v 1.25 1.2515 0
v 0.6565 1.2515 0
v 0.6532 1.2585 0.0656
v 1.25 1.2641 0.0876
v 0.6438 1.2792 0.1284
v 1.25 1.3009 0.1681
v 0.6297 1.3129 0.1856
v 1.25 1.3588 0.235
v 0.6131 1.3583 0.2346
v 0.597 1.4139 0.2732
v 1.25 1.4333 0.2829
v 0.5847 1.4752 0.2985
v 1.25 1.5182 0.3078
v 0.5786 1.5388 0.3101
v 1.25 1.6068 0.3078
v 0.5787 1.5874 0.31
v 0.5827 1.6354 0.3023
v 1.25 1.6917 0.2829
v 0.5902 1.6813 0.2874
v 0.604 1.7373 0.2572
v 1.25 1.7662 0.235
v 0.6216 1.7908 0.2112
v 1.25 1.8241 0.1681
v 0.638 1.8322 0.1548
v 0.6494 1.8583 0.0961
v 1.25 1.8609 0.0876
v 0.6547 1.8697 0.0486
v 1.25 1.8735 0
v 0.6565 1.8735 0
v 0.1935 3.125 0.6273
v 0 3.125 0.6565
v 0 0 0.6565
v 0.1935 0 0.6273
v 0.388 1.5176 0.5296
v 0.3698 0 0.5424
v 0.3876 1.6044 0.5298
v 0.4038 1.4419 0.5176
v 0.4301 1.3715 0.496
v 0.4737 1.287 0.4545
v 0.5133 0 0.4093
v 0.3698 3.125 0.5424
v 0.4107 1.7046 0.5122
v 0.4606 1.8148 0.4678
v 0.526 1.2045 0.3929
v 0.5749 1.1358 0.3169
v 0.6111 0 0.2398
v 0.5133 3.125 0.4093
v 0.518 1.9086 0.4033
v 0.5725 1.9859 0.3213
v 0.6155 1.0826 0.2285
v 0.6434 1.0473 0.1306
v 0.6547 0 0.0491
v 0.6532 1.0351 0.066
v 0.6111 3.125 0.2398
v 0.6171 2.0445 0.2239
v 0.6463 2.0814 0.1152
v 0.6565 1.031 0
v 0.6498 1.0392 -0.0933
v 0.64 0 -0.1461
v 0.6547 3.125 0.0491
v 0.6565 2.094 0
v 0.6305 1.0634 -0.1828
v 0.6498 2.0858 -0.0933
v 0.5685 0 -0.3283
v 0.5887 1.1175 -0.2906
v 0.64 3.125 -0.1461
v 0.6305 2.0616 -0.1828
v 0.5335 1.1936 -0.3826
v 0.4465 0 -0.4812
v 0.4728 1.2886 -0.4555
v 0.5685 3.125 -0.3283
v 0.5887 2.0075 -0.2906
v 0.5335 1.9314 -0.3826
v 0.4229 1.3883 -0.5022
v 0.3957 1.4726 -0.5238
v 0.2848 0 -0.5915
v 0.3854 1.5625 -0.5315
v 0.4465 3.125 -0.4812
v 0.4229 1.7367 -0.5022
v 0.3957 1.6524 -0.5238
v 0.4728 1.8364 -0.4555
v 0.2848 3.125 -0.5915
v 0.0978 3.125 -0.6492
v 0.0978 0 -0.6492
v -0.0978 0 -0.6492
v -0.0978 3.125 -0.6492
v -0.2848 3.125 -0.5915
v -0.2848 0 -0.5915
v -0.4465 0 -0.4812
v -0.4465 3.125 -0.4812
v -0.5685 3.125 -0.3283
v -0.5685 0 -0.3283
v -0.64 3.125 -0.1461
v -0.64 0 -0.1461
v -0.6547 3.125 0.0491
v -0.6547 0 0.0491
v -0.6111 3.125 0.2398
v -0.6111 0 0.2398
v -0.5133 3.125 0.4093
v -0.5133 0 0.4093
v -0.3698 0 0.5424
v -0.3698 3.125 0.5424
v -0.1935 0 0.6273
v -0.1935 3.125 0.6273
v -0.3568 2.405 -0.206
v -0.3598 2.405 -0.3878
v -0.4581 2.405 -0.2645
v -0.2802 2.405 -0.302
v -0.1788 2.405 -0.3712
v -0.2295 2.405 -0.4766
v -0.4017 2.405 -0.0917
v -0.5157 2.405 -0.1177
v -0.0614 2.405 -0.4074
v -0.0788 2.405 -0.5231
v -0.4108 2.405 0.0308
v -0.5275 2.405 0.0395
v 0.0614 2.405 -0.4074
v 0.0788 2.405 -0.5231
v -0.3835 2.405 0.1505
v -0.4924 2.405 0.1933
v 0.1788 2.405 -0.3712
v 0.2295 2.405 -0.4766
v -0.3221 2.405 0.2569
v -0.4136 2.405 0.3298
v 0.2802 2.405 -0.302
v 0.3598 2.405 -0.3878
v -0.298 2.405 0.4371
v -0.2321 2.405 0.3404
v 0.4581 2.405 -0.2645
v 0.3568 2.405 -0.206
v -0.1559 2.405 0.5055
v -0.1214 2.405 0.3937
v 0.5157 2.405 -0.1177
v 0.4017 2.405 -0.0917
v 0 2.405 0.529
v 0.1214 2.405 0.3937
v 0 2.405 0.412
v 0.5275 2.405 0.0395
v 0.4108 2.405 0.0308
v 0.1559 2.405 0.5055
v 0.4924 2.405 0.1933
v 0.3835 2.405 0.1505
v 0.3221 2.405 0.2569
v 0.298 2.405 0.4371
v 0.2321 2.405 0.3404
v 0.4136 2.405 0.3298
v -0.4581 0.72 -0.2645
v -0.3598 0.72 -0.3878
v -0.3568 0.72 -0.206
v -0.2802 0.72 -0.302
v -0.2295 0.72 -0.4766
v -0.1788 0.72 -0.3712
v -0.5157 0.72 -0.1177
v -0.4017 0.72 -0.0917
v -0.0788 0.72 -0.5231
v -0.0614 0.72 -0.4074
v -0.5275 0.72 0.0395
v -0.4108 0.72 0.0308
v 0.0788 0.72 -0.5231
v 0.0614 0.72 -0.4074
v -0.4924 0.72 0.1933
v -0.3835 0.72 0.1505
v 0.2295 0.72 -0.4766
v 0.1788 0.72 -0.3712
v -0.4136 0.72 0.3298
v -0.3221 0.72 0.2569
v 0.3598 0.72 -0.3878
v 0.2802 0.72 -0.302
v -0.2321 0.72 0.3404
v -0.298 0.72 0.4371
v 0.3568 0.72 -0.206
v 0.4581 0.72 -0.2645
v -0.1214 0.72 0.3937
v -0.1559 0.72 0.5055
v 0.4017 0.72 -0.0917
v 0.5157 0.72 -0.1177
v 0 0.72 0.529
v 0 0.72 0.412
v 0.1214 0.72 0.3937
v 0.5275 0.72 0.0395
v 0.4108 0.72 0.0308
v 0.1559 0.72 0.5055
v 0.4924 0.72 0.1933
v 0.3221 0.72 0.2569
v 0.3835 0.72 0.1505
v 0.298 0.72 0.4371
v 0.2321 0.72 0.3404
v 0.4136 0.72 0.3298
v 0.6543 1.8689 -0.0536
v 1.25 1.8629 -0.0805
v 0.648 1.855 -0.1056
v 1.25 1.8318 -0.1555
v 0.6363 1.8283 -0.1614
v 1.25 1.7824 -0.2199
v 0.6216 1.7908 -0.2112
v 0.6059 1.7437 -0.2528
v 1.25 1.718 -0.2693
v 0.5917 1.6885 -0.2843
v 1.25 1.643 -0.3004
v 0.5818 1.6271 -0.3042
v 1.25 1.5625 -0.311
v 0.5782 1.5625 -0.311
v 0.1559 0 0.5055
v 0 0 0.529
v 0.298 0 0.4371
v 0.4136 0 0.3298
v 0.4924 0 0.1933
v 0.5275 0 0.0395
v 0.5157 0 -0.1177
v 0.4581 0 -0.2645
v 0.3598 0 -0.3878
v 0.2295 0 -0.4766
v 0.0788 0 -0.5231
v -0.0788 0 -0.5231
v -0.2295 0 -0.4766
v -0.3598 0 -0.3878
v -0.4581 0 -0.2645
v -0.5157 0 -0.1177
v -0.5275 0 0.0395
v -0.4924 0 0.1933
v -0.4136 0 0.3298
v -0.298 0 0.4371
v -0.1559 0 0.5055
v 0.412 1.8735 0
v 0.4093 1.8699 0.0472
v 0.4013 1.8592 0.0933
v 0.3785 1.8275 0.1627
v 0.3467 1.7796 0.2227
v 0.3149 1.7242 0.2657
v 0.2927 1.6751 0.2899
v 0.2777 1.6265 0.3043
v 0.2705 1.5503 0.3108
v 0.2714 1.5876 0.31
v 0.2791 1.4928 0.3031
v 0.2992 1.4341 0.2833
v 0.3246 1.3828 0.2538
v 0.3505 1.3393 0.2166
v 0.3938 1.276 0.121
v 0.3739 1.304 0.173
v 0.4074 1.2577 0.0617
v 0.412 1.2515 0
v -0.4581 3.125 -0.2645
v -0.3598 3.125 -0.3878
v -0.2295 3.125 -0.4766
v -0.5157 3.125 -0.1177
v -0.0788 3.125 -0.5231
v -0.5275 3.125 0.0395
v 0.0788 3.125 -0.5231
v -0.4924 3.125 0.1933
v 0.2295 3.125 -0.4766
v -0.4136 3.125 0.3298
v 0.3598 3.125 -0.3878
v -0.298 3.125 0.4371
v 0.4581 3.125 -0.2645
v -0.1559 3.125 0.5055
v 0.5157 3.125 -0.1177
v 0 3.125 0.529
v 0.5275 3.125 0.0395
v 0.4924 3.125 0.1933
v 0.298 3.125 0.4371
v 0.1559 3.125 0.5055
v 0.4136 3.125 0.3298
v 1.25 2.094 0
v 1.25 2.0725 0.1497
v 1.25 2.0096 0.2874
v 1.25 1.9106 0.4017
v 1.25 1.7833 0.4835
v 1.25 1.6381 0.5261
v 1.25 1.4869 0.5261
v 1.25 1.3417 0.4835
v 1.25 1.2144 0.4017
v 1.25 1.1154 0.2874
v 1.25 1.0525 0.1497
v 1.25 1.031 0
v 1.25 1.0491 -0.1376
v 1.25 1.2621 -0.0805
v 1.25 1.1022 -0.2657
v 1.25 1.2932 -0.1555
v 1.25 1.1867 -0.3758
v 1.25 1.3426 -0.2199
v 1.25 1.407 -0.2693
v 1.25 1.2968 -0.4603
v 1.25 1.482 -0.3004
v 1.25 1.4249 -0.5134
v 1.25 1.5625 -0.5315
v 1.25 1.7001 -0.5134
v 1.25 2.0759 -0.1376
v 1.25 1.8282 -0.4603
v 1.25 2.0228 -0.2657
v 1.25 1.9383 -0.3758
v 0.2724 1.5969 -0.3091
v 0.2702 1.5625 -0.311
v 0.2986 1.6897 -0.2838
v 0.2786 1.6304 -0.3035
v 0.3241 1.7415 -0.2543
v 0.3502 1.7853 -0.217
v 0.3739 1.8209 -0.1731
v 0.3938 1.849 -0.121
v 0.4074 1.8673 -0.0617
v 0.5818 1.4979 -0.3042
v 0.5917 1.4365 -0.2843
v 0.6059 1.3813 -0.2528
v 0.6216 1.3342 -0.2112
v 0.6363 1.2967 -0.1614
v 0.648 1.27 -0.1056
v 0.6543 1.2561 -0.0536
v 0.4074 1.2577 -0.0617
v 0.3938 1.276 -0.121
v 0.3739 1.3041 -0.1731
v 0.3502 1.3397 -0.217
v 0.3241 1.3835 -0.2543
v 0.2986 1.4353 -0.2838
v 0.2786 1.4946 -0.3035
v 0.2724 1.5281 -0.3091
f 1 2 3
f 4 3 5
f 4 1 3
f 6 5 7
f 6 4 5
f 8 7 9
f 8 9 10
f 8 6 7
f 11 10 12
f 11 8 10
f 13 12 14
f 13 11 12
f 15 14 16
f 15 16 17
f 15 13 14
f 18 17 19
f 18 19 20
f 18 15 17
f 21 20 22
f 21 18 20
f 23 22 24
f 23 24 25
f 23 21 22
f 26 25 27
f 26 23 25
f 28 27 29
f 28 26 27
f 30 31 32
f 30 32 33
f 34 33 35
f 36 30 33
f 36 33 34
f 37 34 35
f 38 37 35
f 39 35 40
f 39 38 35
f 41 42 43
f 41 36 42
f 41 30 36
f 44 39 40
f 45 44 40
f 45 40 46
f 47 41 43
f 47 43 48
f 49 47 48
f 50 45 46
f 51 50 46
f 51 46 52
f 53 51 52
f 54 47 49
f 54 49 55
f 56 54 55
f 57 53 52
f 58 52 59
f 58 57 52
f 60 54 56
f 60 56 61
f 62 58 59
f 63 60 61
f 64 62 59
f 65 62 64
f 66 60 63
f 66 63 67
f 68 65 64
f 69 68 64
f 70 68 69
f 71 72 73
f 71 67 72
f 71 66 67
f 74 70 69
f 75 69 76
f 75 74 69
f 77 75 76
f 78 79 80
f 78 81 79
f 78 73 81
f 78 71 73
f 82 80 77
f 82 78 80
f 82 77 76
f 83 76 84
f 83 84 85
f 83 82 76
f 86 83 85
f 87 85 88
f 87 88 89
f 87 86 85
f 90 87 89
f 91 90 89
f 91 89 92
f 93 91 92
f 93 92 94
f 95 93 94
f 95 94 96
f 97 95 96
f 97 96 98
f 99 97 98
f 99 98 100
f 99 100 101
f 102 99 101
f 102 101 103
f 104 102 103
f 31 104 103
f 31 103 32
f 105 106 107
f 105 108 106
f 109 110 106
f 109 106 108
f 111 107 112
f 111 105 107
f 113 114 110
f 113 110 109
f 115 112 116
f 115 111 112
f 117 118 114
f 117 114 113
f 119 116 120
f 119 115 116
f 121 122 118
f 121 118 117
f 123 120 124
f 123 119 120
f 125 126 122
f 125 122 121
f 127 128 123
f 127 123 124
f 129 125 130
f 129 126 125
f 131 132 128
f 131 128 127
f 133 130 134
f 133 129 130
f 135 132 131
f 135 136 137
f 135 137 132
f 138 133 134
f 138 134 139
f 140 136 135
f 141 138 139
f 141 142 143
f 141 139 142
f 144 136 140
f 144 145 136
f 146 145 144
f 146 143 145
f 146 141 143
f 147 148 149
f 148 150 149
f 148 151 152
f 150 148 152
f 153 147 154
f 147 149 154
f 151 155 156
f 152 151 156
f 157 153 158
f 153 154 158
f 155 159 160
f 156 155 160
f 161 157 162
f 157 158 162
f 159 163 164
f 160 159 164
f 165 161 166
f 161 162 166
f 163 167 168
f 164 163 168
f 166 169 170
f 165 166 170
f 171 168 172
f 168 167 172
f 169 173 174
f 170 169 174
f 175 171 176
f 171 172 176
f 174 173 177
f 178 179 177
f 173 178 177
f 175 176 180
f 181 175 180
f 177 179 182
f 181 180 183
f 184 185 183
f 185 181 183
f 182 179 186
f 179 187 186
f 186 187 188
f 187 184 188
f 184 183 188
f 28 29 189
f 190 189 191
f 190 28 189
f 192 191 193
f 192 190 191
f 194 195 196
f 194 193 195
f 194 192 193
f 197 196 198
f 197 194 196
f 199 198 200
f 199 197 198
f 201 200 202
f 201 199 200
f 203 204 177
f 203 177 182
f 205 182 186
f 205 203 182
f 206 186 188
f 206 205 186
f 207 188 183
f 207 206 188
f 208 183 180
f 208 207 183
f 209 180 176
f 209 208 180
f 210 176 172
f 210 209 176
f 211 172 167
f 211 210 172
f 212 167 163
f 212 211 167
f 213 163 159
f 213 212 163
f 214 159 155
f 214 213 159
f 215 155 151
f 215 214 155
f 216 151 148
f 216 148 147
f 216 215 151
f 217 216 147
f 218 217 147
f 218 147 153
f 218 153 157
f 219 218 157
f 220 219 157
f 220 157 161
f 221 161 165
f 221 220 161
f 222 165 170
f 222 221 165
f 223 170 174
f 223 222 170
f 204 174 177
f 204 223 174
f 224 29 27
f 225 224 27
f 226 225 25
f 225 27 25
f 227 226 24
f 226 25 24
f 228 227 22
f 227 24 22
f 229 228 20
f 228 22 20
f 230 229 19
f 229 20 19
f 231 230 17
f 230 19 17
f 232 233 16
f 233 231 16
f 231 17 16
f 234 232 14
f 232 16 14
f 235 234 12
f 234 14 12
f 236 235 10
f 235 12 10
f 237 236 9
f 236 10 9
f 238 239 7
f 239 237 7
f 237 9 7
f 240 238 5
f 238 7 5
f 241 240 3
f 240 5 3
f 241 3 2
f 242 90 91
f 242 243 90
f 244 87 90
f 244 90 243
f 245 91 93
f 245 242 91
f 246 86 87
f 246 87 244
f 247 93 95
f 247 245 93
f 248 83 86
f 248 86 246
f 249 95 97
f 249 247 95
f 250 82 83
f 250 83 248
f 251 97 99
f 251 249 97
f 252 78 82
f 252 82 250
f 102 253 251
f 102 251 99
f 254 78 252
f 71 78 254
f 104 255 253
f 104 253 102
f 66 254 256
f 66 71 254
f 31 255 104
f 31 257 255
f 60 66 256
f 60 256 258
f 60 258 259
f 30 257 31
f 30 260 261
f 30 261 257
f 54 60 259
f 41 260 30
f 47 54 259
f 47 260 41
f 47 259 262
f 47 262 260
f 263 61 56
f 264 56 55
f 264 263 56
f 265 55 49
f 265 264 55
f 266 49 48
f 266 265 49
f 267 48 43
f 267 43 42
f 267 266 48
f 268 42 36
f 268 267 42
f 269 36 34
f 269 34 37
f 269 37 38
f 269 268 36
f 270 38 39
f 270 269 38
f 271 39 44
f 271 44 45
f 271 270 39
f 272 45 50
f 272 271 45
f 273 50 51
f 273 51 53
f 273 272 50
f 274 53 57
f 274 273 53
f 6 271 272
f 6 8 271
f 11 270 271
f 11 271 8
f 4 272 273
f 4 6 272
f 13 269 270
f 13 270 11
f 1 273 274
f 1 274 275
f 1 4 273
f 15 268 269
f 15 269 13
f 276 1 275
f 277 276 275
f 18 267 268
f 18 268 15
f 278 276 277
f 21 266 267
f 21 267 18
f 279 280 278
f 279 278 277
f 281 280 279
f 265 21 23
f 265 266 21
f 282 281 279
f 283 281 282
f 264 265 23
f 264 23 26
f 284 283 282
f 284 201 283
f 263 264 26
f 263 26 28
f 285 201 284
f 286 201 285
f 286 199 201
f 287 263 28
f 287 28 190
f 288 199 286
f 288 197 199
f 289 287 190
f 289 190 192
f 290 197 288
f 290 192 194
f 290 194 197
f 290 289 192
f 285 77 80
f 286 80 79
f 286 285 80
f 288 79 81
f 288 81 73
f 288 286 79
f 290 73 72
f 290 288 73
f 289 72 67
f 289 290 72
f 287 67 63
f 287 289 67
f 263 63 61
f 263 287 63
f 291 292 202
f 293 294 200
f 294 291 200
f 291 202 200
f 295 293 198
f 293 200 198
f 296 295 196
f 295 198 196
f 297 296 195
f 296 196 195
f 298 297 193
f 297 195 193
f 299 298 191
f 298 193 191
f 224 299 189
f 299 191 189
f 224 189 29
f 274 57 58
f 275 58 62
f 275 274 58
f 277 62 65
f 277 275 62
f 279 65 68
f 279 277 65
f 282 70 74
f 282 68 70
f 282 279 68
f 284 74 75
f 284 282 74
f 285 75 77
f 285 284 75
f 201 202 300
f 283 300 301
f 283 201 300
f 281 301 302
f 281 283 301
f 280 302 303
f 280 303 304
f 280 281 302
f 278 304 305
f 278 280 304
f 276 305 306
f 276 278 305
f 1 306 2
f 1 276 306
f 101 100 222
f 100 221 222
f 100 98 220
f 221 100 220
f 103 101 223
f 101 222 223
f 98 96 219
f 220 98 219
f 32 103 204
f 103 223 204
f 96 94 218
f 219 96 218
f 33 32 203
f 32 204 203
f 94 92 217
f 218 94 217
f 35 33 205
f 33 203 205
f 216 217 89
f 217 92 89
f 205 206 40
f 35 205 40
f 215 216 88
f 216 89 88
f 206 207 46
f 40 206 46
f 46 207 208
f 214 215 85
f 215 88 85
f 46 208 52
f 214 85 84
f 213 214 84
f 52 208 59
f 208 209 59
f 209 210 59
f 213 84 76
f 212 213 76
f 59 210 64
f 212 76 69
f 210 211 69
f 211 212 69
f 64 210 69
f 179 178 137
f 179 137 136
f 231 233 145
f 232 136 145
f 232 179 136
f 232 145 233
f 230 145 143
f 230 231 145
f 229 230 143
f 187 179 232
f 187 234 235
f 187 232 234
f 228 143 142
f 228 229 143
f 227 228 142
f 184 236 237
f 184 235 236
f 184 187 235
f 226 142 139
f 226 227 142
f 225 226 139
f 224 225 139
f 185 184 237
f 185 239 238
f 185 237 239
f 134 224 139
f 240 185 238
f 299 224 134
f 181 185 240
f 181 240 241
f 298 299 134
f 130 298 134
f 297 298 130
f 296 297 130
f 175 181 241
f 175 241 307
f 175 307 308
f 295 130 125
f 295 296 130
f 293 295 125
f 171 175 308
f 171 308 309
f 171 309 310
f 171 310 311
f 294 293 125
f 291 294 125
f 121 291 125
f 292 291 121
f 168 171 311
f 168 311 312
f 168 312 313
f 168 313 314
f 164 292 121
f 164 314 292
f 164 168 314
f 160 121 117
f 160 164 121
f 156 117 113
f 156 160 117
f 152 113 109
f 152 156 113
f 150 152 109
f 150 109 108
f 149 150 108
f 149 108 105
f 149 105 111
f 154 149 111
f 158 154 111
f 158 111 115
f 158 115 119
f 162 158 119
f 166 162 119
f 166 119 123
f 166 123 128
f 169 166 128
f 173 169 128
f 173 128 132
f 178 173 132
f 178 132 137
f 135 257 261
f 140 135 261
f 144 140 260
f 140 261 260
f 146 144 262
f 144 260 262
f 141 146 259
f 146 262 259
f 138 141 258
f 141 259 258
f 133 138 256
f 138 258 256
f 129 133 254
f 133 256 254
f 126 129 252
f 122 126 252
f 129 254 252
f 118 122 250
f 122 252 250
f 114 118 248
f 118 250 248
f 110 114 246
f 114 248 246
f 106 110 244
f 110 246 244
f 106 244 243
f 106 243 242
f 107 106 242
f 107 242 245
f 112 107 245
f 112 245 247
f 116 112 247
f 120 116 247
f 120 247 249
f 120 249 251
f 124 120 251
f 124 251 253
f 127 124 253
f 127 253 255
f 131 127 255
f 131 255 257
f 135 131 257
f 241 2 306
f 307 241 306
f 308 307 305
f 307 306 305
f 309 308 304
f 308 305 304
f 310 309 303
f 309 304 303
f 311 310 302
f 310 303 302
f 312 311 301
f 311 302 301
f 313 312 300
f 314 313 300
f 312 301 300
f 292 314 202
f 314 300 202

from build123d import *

# Parameters (mm, degrees)
SKETCH1_R                = 0.6565
SKETCH1_R_2              = 0.529
SKETCH1_R_3              = 0.412
BOSS_EXTRUDE1_DEPTH      = 1.5625
SKETCH1_3_R              = 0.529
SKETCH1_3_R_2            = 0.412
CUT_EXTRUDE1_DEPTH       = 0.72
BOSS_EXTRUDE2_REACH      = 5.719
BOSS_EXTRUDE2_END_RADIUS = 0.6565
CUT_EXTRUDE2_REACH       = 5.719


with BuildPart() as part:
    # Sketch1 → Boss-Extrude1 (new body)
    # profile 1 of 2: a face of its own
    with BuildSketch(Plane(origin=(0, 0, 0), x_dir=(1, 0, 0), z_dir=(0, 1, 0))):
        with Locations(Location((0, 0, 0), (0, 0, 270))):
            Circle(SKETCH1_R)
        Circle(SKETCH1_R_2, mode=Mode.SUBTRACT)
    # profile 2 of 2: a face of its own
    with BuildSketch(Plane(origin=(0, 0, 0), x_dir=(1, 0, 0), z_dir=(0, 1, 0))):
        Circle(SKETCH1_R_2)
        with Locations(Location((0, 0, 0), (0, 0, 270))):
            Circle(SKETCH1_R_3, mode=Mode.SUBTRACT)
    boss_extrude1 = extrude(amount=BOSS_EXTRUDE1_DEPTH)

    # Sketch1<3> → Cut-Extrude1 (cut)
    with BuildSketch(Plane(origin=(0, 0, 0), x_dir=(1, 0, 0), z_dir=(0, 1, 0))):
        with Locations(Location((0, 0, 0), (0, 0, 270))):
            Circle(SKETCH1_3_R)
        with Locations(Location((0, 0, 0), (0, 0, 270))):
            Circle(SKETCH1_3_R_2, mode=Mode.SUBTRACT)
    cut_extrude1 = extrude(amount=CUT_EXTRUDE1_DEPTH, mode=Mode.SUBTRACT)

    # Mirror1: Boss-Extrude1, Cut-Extrude1 across plane
    add(boss_extrude1.mirror(Plane.ZX.offset(1.5625)))
    add(cut_extrude1.mirror(Plane.ZX.offset(1.5625)), mode=Mode.SUBTRACT)

    # Boss-Extrude2: up to this cylinder (the profile starts outside it)
    boss_extrude2_end = Plane(origin=(0, 1.378788, 0), z_dir=(0, -1, 0)) * Cylinder(BOSS_EXTRUDE2_END_RADIUS, 14.118424, mode=Mode.PRIVATE)
    # Sketch2 → Boss-Extrude2 (add, up to the surface)
    with BuildSketch(Plane(origin=(1.25, 0, 0), x_dir=(0, 0, -1), z_dir=(1, 0, 0)), mode=Mode.PRIVATE) as boss_extrude2_sk1:
        with BuildLine():
            ThreePointArc((0.5315, 1.5625), (0.375827254, 1.938327254), (0, 2.094))
            Line((0, 2.094), (0, 1.9865))
            ThreePointArc((0, 1.9865), (0.299813275, 1.862313275), (0.424, 1.5625))
            ThreePointArc((0.424, 1.5625), (0.299813275, 1.262686725), (0, 1.1385))
            Line((0, 1.1385), (0, 1.031))
            ThreePointArc((0, 1.031), (0.375827254, 1.186672746), (0.5315, 1.5625))
        make_face()
    boss_extrude2_tool1 = extrude(boss_extrude2_sk1.sketch, amount=-BOSS_EXTRUDE2_REACH, mode=Mode.PRIVATE) - boss_extrude2_end
    add(boss_extrude2_tool1.solids().sort_by_distance((1.25, 1.195076, -0.367424))[0])
    # Sketch2 → Boss-Extrude2 (add, up to the surface)
    with BuildSketch(Plane(origin=(1.25, 0, 0), x_dir=(0, 0, -1), z_dir=(1, 0, 0)), mode=Mode.PRIVATE) as boss_extrude2_sk2:
        with BuildLine():
            Line((0, 1.9865), (0, 2.094))
            ThreePointArc((0, 2.094), (-0.5315, 1.5625), (0, 1.031))
            Line((0, 1.031), (0, 1.1385))
            ThreePointArc((0, 1.1385), (-0.424, 1.5625), (0, 1.9865))
        make_face()
    boss_extrude2_tool2 = extrude(boss_extrude2_sk2.sketch, amount=-BOSS_EXTRUDE2_REACH, mode=Mode.PRIVATE) - boss_extrude2_end
    add(boss_extrude2_tool2.solids().sort_by_distance((1.25, 1.5625, 0.519615))[0])
    # Sketch2 → Boss-Extrude2 (add, up to the surface)
    with BuildSketch(Plane(origin=(1.25, 0, 0), x_dir=(0, 0, -1), z_dir=(1, 0, 0)), mode=Mode.PRIVATE) as boss_extrude2_sk3:
        with BuildLine():
            ThreePointArc((0.424, 1.5625), (0.299813275, 1.862313275), (0, 1.9865))
            Line((0, 1.9865), (0, 1.8735))
            ThreePointArc((0, 1.8735), (0.219910209, 1.782410209), (0.311, 1.5625))
            ThreePointArc((0.311, 1.5625), (0.219910209, 1.342589791), (0, 1.2515))
            Line((0, 1.2515), (0, 1.1385))
            ThreePointArc((0, 1.1385), (0.299813275, 1.262686725), (0.424, 1.5625))
        make_face()
    boss_extrude2_tool3 = extrude(boss_extrude2_sk3.sketch, amount=-BOSS_EXTRUDE2_REACH, mode=Mode.PRIVATE) - boss_extrude2_end
    add(boss_extrude2_tool3.solids().sort_by_distance((1.25, 1.269391, -0.293109))[0])
    # Sketch2 → Boss-Extrude2 (add, up to the surface)
    with BuildSketch(Plane(origin=(1.25, 0, 0), x_dir=(0, 0, -1), z_dir=(1, 0, 0)), mode=Mode.PRIVATE) as boss_extrude2_sk4:
        with BuildLine():
            Line((0, 1.8735), (0, 1.9865))
            ThreePointArc((0, 1.9865), (-0.424, 1.5625), (0, 1.1385))
            Line((0, 1.1385), (0, 1.2515))
            ThreePointArc((0, 1.2515), (-0.311, 1.5625), (0, 1.8735))
        make_face()
    boss_extrude2_tool4 = extrude(boss_extrude2_sk4.sketch, amount=-BOSS_EXTRUDE2_REACH, mode=Mode.PRIVATE) - boss_extrude2_end
    add(boss_extrude2_tool4.solids().sort_by_distance((1.25, 1.5625, 0.320481))[0])
    # Sketch2 → Boss-Extrude2 (add, up to the surface)
    with BuildSketch(Plane(origin=(1.25, 0, 0), x_dir=(0, 0, -1), z_dir=(1, 0, 0)), mode=Mode.PRIVATE) as boss_extrude2_sk5:
        with BuildLine():
            ThreePointArc((0.424, 1.5625), (0.299813275, 1.862313275), (0, 1.9865))
            Line((0, 1.9865), (0, 1.8735))
            ThreePointArc((0, 1.8735), (0.219910209, 1.782410209), (0.311, 1.5625))
            ThreePointArc((0.311, 1.5625), (0.219910209, 1.342589791), (0, 1.2515))
            Line((0, 1.2515), (0, 1.1385))
            ThreePointArc((0, 1.1385), (0.299813275, 1.262686725), (0.424, 1.5625))
        make_face()
    boss_extrude2_tool5 = extrude(boss_extrude2_sk5.sketch, amount=-BOSS_EXTRUDE2_REACH, mode=Mode.PRIVATE) - boss_extrude2_end
    add(boss_extrude2_tool5.solids().sort_by_distance((1.25, 1.269391, -0.293109))[0])
    # Sketch2 → Boss-Extrude2 (add, up to the surface)
    with BuildSketch(Plane(origin=(1.25, 0, 0), x_dir=(0, 0, -1), z_dir=(1, 0, 0)), mode=Mode.PRIVATE) as boss_extrude2_sk6:
        with BuildLine():
            Line((0, 1.8735), (0, 1.9865))
            ThreePointArc((0, 1.9865), (-0.424, 1.5625), (0, 1.1385))
            Line((0, 1.1385), (0, 1.2515))
            ThreePointArc((0, 1.2515), (-0.311, 1.5625), (0, 1.8735))
        make_face()
    boss_extrude2_tool6 = extrude(boss_extrude2_sk6.sketch, amount=-BOSS_EXTRUDE2_REACH, mode=Mode.PRIVATE) - boss_extrude2_end
    add(boss_extrude2_tool6.solids().sort_by_distance((1.25, 1.5625, 0.320481))[0])
    # Sketch2 → Boss-Extrude2 (add, up to the surface)
    with BuildSketch(Plane(origin=(1.25, 0, 0), x_dir=(0, 0, -1), z_dir=(1, 0, 0)), mode=Mode.PRIVATE) as boss_extrude2_sk7:
        with BuildLine():
            ThreePointArc((0.5315, 1.5625), (0.375827254, 1.938327254), (0, 2.094))
            Line((0, 2.094), (0, 1.9865))
            ThreePointArc((0, 1.9865), (0.299813275, 1.862313275), (0.424, 1.5625))
            ThreePointArc((0.424, 1.5625), (0.299813275, 1.262686725), (0, 1.1385))
            Line((0, 1.1385), (0, 1.031))
            ThreePointArc((0, 1.031), (0.375827254, 1.186672746), (0.5315, 1.5625))
        make_face()
    boss_extrude2_tool7 = extrude(boss_extrude2_sk7.sketch, amount=-BOSS_EXTRUDE2_REACH, mode=Mode.PRIVATE) - boss_extrude2_end
    add(boss_extrude2_tool7.solids().sort_by_distance((1.25, 1.195076, -0.367424))[0])
    # Sketch2 → Boss-Extrude2 (add, up to the surface)
    with BuildSketch(Plane(origin=(1.25, 0, 0), x_dir=(0, 0, -1), z_dir=(1, 0, 0)), mode=Mode.PRIVATE) as boss_extrude2_sk8:
        with BuildLine():
            Line((0, 1.9865), (0, 2.094))
            ThreePointArc((0, 2.094), (-0.5315, 1.5625), (0, 1.031))
            Line((0, 1.031), (0, 1.1385))
            ThreePointArc((0, 1.1385), (-0.424, 1.5625), (0, 1.9865))
        make_face()
    boss_extrude2_tool8 = extrude(boss_extrude2_sk8.sketch, amount=-BOSS_EXTRUDE2_REACH, mode=Mode.PRIVATE) - boss_extrude2_end
    add(boss_extrude2_tool8.solids().sort_by_distance((1.25, 1.5625, 0.519615))[0])

    # Sketch2<3> → Cut-Extrude2 (cut, up to next)
    with BuildSketch(Plane(origin=(1.25, 0, 0), x_dir=(0, 0, -1), z_dir=(1, 0, 0)), mode=Mode.PRIVATE) as cut_extrude2_sk1:
        with BuildLine():
            ThreePointArc((0.311, 1.5625), (0.219910209, 1.782410209), (0, 1.8735))
            Line((0, 1.8735), (0, 1.2515))
            ThreePointArc((0, 1.2515), (0.219910209, 1.342589791), (0.311, 1.5625))
        make_face()
    cut_extrude2_tool1 = extrude(cut_extrude2_sk1.sketch, amount=-CUT_EXTRUDE2_REACH, mode=Mode.PRIVATE) & part.part
    # Sketch2<3> → Cut-Extrude2 (cut, up to next)
    with BuildSketch(Plane(origin=(1.25, 0, 0), x_dir=(0, 0, -1), z_dir=(1, 0, 0)), mode=Mode.PRIVATE) as cut_extrude2_sk2:
        with BuildLine():
            Line((0, 1.2515), (0, 1.8735))
            ThreePointArc((0, 1.8735), (-0.311, 1.5625), (0, 1.2515))
        make_face()
    cut_extrude2_tool2 = extrude(cut_extrude2_sk2.sketch, amount=-CUT_EXTRUDE2_REACH, mode=Mode.PRIVATE) & part.part
    # Sketch2<3> → Cut-Extrude2 (cut, up to next)
    with BuildSketch(Plane(origin=(1.25, 0, 0), x_dir=(0, 0, -1), z_dir=(1, 0, 0)), mode=Mode.PRIVATE) as cut_extrude2_sk3:
        with BuildLine():
            ThreePointArc((0.311, 1.5625), (0.219910209, 1.782410209), (0, 1.8735))
            Line((0, 1.8735), (0, 1.2515))
            ThreePointArc((0, 1.2515), (0.219910209, 1.342589791), (0.311, 1.5625))
        make_face()
    cut_extrude2_tool3 = extrude(cut_extrude2_sk3.sketch, amount=-CUT_EXTRUDE2_REACH, mode=Mode.PRIVATE) & part.part
    # Sketch2<3> → Cut-Extrude2 (cut, up to next)
    with BuildSketch(Plane(origin=(1.25, 0, 0), x_dir=(0, 0, -1), z_dir=(1, 0, 0)), mode=Mode.PRIVATE) as cut_extrude2_sk4:
        with BuildLine():
            Line((0, 1.2515), (0, 1.8735))
            ThreePointArc((0, 1.8735), (-0.311, 1.5625), (0, 1.2515))
        make_face()
    cut_extrude2_tool4 = extrude(cut_extrude2_sk4.sketch, amount=-CUT_EXTRUDE2_REACH, mode=Mode.PRIVATE) & part.part
    add(cut_extrude2_tool1.solids().sort_by_distance((1.25, 1.5625, -0.131992))[0], mode=Mode.SUBTRACT)
    add(cut_extrude2_tool2.solids().sort_by_distance((1.25, 1.5625, 0.131992))[0], mode=Mode.SUBTRACT)
    add(cut_extrude2_tool3.solids().sort_by_distance((1.25, 1.5625, -0.131992))[0], mode=Mode.SUBTRACT)
    add(cut_extrude2_tool4.solids().sort_by_distance((1.25, 1.5625, 0.131992))[0], mode=Mode.SUBTRACT)


solid = part.part
